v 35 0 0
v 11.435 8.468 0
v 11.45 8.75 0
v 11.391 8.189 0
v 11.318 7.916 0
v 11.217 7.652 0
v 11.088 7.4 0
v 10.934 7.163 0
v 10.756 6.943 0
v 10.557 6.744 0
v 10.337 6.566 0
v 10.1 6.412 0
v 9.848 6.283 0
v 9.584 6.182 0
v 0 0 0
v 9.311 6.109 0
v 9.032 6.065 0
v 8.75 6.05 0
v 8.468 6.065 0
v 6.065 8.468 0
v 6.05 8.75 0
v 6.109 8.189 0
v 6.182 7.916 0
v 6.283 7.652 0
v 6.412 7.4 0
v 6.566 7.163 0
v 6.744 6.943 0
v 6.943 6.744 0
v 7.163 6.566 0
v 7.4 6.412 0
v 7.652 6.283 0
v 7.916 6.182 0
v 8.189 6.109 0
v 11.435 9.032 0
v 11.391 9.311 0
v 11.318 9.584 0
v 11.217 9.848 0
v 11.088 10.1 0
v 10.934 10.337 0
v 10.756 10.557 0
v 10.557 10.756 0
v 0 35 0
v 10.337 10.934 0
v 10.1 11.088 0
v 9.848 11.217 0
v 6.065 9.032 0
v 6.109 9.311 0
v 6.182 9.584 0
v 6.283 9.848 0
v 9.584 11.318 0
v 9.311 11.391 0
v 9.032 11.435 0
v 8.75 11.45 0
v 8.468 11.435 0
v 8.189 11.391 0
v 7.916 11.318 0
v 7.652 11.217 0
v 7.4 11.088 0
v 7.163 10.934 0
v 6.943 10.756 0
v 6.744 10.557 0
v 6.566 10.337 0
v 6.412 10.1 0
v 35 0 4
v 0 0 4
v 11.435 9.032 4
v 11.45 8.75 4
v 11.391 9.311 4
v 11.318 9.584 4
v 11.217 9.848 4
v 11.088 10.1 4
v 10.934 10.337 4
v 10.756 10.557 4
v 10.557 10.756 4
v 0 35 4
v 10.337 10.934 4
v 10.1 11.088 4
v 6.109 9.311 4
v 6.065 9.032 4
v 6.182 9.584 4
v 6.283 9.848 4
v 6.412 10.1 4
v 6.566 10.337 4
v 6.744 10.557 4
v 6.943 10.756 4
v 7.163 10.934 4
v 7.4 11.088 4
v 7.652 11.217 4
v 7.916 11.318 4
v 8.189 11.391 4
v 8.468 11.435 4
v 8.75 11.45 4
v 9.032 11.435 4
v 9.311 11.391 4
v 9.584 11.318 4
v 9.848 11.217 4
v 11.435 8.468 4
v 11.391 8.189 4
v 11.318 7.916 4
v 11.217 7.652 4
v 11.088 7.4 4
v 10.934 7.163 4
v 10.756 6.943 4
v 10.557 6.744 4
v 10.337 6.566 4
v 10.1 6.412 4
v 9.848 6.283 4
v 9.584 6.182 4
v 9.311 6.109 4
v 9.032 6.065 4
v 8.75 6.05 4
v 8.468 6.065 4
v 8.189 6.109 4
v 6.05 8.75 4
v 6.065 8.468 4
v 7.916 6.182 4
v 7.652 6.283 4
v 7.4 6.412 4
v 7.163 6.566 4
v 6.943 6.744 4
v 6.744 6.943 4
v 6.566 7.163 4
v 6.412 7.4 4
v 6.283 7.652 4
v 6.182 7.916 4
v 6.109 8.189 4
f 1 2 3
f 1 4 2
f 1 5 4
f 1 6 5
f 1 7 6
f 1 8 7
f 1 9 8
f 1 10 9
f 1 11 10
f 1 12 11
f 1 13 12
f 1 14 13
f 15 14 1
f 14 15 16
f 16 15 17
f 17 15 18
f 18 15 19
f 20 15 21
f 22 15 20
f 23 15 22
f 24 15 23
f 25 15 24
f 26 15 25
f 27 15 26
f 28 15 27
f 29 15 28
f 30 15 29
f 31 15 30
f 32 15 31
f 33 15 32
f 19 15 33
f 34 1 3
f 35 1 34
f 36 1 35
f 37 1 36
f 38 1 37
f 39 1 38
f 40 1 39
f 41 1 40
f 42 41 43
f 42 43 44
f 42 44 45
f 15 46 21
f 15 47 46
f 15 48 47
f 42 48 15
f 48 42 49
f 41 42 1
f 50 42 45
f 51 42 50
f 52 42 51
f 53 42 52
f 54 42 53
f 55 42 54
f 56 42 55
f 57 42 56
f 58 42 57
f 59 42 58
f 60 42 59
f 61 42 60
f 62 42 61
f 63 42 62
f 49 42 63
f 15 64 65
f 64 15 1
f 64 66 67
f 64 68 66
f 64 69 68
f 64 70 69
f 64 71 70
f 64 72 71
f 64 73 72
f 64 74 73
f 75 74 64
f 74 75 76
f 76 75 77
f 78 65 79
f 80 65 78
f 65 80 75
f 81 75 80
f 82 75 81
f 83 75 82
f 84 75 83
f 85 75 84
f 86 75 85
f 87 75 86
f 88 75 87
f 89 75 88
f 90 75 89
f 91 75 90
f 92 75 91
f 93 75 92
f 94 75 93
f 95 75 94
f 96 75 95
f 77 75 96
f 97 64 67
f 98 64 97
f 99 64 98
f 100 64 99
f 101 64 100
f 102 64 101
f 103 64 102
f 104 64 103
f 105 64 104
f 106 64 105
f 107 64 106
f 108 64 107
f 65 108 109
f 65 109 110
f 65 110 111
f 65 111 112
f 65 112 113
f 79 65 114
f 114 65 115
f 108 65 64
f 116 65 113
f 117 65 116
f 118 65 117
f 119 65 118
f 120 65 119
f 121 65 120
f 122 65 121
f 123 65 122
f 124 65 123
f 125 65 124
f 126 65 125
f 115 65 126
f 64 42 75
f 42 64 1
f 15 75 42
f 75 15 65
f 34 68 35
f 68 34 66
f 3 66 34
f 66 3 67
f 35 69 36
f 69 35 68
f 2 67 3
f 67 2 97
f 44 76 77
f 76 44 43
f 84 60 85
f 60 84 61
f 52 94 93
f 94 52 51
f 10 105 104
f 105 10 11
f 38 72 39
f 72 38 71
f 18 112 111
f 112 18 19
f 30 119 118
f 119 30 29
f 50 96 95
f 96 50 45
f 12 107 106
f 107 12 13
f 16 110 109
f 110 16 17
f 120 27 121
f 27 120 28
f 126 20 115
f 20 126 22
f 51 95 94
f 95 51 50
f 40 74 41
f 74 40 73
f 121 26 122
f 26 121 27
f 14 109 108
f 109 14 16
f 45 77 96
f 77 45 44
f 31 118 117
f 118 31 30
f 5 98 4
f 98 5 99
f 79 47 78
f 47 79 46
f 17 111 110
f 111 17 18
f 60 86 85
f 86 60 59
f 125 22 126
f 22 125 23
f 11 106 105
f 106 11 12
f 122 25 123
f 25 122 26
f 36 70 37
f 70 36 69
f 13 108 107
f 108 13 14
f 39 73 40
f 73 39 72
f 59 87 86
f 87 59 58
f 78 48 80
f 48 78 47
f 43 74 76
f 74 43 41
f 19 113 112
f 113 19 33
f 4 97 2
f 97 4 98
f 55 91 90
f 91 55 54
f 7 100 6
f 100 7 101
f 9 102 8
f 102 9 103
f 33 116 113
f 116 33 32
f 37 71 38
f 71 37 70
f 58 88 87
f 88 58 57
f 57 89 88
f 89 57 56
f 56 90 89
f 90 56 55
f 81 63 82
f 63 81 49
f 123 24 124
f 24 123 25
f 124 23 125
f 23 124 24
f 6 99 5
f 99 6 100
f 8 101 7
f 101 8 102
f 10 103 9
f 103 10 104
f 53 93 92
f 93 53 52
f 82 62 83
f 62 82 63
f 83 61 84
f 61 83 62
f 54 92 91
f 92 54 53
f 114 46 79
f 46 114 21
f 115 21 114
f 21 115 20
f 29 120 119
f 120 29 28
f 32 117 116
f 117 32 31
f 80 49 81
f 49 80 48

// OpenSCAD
// Triangular reinforcement gusset.
$fn = 60;
eps = 0.02;
leg = 35;
thickness = 4;
difference() {
    linear_extrude(height=thickness) polygon(points=[[0,0],[leg,0],[0,leg]]);
    translate([leg*0.25,leg*0.25,-eps]) cylinder(d=5.4,h=thickness+2*eps);
}
